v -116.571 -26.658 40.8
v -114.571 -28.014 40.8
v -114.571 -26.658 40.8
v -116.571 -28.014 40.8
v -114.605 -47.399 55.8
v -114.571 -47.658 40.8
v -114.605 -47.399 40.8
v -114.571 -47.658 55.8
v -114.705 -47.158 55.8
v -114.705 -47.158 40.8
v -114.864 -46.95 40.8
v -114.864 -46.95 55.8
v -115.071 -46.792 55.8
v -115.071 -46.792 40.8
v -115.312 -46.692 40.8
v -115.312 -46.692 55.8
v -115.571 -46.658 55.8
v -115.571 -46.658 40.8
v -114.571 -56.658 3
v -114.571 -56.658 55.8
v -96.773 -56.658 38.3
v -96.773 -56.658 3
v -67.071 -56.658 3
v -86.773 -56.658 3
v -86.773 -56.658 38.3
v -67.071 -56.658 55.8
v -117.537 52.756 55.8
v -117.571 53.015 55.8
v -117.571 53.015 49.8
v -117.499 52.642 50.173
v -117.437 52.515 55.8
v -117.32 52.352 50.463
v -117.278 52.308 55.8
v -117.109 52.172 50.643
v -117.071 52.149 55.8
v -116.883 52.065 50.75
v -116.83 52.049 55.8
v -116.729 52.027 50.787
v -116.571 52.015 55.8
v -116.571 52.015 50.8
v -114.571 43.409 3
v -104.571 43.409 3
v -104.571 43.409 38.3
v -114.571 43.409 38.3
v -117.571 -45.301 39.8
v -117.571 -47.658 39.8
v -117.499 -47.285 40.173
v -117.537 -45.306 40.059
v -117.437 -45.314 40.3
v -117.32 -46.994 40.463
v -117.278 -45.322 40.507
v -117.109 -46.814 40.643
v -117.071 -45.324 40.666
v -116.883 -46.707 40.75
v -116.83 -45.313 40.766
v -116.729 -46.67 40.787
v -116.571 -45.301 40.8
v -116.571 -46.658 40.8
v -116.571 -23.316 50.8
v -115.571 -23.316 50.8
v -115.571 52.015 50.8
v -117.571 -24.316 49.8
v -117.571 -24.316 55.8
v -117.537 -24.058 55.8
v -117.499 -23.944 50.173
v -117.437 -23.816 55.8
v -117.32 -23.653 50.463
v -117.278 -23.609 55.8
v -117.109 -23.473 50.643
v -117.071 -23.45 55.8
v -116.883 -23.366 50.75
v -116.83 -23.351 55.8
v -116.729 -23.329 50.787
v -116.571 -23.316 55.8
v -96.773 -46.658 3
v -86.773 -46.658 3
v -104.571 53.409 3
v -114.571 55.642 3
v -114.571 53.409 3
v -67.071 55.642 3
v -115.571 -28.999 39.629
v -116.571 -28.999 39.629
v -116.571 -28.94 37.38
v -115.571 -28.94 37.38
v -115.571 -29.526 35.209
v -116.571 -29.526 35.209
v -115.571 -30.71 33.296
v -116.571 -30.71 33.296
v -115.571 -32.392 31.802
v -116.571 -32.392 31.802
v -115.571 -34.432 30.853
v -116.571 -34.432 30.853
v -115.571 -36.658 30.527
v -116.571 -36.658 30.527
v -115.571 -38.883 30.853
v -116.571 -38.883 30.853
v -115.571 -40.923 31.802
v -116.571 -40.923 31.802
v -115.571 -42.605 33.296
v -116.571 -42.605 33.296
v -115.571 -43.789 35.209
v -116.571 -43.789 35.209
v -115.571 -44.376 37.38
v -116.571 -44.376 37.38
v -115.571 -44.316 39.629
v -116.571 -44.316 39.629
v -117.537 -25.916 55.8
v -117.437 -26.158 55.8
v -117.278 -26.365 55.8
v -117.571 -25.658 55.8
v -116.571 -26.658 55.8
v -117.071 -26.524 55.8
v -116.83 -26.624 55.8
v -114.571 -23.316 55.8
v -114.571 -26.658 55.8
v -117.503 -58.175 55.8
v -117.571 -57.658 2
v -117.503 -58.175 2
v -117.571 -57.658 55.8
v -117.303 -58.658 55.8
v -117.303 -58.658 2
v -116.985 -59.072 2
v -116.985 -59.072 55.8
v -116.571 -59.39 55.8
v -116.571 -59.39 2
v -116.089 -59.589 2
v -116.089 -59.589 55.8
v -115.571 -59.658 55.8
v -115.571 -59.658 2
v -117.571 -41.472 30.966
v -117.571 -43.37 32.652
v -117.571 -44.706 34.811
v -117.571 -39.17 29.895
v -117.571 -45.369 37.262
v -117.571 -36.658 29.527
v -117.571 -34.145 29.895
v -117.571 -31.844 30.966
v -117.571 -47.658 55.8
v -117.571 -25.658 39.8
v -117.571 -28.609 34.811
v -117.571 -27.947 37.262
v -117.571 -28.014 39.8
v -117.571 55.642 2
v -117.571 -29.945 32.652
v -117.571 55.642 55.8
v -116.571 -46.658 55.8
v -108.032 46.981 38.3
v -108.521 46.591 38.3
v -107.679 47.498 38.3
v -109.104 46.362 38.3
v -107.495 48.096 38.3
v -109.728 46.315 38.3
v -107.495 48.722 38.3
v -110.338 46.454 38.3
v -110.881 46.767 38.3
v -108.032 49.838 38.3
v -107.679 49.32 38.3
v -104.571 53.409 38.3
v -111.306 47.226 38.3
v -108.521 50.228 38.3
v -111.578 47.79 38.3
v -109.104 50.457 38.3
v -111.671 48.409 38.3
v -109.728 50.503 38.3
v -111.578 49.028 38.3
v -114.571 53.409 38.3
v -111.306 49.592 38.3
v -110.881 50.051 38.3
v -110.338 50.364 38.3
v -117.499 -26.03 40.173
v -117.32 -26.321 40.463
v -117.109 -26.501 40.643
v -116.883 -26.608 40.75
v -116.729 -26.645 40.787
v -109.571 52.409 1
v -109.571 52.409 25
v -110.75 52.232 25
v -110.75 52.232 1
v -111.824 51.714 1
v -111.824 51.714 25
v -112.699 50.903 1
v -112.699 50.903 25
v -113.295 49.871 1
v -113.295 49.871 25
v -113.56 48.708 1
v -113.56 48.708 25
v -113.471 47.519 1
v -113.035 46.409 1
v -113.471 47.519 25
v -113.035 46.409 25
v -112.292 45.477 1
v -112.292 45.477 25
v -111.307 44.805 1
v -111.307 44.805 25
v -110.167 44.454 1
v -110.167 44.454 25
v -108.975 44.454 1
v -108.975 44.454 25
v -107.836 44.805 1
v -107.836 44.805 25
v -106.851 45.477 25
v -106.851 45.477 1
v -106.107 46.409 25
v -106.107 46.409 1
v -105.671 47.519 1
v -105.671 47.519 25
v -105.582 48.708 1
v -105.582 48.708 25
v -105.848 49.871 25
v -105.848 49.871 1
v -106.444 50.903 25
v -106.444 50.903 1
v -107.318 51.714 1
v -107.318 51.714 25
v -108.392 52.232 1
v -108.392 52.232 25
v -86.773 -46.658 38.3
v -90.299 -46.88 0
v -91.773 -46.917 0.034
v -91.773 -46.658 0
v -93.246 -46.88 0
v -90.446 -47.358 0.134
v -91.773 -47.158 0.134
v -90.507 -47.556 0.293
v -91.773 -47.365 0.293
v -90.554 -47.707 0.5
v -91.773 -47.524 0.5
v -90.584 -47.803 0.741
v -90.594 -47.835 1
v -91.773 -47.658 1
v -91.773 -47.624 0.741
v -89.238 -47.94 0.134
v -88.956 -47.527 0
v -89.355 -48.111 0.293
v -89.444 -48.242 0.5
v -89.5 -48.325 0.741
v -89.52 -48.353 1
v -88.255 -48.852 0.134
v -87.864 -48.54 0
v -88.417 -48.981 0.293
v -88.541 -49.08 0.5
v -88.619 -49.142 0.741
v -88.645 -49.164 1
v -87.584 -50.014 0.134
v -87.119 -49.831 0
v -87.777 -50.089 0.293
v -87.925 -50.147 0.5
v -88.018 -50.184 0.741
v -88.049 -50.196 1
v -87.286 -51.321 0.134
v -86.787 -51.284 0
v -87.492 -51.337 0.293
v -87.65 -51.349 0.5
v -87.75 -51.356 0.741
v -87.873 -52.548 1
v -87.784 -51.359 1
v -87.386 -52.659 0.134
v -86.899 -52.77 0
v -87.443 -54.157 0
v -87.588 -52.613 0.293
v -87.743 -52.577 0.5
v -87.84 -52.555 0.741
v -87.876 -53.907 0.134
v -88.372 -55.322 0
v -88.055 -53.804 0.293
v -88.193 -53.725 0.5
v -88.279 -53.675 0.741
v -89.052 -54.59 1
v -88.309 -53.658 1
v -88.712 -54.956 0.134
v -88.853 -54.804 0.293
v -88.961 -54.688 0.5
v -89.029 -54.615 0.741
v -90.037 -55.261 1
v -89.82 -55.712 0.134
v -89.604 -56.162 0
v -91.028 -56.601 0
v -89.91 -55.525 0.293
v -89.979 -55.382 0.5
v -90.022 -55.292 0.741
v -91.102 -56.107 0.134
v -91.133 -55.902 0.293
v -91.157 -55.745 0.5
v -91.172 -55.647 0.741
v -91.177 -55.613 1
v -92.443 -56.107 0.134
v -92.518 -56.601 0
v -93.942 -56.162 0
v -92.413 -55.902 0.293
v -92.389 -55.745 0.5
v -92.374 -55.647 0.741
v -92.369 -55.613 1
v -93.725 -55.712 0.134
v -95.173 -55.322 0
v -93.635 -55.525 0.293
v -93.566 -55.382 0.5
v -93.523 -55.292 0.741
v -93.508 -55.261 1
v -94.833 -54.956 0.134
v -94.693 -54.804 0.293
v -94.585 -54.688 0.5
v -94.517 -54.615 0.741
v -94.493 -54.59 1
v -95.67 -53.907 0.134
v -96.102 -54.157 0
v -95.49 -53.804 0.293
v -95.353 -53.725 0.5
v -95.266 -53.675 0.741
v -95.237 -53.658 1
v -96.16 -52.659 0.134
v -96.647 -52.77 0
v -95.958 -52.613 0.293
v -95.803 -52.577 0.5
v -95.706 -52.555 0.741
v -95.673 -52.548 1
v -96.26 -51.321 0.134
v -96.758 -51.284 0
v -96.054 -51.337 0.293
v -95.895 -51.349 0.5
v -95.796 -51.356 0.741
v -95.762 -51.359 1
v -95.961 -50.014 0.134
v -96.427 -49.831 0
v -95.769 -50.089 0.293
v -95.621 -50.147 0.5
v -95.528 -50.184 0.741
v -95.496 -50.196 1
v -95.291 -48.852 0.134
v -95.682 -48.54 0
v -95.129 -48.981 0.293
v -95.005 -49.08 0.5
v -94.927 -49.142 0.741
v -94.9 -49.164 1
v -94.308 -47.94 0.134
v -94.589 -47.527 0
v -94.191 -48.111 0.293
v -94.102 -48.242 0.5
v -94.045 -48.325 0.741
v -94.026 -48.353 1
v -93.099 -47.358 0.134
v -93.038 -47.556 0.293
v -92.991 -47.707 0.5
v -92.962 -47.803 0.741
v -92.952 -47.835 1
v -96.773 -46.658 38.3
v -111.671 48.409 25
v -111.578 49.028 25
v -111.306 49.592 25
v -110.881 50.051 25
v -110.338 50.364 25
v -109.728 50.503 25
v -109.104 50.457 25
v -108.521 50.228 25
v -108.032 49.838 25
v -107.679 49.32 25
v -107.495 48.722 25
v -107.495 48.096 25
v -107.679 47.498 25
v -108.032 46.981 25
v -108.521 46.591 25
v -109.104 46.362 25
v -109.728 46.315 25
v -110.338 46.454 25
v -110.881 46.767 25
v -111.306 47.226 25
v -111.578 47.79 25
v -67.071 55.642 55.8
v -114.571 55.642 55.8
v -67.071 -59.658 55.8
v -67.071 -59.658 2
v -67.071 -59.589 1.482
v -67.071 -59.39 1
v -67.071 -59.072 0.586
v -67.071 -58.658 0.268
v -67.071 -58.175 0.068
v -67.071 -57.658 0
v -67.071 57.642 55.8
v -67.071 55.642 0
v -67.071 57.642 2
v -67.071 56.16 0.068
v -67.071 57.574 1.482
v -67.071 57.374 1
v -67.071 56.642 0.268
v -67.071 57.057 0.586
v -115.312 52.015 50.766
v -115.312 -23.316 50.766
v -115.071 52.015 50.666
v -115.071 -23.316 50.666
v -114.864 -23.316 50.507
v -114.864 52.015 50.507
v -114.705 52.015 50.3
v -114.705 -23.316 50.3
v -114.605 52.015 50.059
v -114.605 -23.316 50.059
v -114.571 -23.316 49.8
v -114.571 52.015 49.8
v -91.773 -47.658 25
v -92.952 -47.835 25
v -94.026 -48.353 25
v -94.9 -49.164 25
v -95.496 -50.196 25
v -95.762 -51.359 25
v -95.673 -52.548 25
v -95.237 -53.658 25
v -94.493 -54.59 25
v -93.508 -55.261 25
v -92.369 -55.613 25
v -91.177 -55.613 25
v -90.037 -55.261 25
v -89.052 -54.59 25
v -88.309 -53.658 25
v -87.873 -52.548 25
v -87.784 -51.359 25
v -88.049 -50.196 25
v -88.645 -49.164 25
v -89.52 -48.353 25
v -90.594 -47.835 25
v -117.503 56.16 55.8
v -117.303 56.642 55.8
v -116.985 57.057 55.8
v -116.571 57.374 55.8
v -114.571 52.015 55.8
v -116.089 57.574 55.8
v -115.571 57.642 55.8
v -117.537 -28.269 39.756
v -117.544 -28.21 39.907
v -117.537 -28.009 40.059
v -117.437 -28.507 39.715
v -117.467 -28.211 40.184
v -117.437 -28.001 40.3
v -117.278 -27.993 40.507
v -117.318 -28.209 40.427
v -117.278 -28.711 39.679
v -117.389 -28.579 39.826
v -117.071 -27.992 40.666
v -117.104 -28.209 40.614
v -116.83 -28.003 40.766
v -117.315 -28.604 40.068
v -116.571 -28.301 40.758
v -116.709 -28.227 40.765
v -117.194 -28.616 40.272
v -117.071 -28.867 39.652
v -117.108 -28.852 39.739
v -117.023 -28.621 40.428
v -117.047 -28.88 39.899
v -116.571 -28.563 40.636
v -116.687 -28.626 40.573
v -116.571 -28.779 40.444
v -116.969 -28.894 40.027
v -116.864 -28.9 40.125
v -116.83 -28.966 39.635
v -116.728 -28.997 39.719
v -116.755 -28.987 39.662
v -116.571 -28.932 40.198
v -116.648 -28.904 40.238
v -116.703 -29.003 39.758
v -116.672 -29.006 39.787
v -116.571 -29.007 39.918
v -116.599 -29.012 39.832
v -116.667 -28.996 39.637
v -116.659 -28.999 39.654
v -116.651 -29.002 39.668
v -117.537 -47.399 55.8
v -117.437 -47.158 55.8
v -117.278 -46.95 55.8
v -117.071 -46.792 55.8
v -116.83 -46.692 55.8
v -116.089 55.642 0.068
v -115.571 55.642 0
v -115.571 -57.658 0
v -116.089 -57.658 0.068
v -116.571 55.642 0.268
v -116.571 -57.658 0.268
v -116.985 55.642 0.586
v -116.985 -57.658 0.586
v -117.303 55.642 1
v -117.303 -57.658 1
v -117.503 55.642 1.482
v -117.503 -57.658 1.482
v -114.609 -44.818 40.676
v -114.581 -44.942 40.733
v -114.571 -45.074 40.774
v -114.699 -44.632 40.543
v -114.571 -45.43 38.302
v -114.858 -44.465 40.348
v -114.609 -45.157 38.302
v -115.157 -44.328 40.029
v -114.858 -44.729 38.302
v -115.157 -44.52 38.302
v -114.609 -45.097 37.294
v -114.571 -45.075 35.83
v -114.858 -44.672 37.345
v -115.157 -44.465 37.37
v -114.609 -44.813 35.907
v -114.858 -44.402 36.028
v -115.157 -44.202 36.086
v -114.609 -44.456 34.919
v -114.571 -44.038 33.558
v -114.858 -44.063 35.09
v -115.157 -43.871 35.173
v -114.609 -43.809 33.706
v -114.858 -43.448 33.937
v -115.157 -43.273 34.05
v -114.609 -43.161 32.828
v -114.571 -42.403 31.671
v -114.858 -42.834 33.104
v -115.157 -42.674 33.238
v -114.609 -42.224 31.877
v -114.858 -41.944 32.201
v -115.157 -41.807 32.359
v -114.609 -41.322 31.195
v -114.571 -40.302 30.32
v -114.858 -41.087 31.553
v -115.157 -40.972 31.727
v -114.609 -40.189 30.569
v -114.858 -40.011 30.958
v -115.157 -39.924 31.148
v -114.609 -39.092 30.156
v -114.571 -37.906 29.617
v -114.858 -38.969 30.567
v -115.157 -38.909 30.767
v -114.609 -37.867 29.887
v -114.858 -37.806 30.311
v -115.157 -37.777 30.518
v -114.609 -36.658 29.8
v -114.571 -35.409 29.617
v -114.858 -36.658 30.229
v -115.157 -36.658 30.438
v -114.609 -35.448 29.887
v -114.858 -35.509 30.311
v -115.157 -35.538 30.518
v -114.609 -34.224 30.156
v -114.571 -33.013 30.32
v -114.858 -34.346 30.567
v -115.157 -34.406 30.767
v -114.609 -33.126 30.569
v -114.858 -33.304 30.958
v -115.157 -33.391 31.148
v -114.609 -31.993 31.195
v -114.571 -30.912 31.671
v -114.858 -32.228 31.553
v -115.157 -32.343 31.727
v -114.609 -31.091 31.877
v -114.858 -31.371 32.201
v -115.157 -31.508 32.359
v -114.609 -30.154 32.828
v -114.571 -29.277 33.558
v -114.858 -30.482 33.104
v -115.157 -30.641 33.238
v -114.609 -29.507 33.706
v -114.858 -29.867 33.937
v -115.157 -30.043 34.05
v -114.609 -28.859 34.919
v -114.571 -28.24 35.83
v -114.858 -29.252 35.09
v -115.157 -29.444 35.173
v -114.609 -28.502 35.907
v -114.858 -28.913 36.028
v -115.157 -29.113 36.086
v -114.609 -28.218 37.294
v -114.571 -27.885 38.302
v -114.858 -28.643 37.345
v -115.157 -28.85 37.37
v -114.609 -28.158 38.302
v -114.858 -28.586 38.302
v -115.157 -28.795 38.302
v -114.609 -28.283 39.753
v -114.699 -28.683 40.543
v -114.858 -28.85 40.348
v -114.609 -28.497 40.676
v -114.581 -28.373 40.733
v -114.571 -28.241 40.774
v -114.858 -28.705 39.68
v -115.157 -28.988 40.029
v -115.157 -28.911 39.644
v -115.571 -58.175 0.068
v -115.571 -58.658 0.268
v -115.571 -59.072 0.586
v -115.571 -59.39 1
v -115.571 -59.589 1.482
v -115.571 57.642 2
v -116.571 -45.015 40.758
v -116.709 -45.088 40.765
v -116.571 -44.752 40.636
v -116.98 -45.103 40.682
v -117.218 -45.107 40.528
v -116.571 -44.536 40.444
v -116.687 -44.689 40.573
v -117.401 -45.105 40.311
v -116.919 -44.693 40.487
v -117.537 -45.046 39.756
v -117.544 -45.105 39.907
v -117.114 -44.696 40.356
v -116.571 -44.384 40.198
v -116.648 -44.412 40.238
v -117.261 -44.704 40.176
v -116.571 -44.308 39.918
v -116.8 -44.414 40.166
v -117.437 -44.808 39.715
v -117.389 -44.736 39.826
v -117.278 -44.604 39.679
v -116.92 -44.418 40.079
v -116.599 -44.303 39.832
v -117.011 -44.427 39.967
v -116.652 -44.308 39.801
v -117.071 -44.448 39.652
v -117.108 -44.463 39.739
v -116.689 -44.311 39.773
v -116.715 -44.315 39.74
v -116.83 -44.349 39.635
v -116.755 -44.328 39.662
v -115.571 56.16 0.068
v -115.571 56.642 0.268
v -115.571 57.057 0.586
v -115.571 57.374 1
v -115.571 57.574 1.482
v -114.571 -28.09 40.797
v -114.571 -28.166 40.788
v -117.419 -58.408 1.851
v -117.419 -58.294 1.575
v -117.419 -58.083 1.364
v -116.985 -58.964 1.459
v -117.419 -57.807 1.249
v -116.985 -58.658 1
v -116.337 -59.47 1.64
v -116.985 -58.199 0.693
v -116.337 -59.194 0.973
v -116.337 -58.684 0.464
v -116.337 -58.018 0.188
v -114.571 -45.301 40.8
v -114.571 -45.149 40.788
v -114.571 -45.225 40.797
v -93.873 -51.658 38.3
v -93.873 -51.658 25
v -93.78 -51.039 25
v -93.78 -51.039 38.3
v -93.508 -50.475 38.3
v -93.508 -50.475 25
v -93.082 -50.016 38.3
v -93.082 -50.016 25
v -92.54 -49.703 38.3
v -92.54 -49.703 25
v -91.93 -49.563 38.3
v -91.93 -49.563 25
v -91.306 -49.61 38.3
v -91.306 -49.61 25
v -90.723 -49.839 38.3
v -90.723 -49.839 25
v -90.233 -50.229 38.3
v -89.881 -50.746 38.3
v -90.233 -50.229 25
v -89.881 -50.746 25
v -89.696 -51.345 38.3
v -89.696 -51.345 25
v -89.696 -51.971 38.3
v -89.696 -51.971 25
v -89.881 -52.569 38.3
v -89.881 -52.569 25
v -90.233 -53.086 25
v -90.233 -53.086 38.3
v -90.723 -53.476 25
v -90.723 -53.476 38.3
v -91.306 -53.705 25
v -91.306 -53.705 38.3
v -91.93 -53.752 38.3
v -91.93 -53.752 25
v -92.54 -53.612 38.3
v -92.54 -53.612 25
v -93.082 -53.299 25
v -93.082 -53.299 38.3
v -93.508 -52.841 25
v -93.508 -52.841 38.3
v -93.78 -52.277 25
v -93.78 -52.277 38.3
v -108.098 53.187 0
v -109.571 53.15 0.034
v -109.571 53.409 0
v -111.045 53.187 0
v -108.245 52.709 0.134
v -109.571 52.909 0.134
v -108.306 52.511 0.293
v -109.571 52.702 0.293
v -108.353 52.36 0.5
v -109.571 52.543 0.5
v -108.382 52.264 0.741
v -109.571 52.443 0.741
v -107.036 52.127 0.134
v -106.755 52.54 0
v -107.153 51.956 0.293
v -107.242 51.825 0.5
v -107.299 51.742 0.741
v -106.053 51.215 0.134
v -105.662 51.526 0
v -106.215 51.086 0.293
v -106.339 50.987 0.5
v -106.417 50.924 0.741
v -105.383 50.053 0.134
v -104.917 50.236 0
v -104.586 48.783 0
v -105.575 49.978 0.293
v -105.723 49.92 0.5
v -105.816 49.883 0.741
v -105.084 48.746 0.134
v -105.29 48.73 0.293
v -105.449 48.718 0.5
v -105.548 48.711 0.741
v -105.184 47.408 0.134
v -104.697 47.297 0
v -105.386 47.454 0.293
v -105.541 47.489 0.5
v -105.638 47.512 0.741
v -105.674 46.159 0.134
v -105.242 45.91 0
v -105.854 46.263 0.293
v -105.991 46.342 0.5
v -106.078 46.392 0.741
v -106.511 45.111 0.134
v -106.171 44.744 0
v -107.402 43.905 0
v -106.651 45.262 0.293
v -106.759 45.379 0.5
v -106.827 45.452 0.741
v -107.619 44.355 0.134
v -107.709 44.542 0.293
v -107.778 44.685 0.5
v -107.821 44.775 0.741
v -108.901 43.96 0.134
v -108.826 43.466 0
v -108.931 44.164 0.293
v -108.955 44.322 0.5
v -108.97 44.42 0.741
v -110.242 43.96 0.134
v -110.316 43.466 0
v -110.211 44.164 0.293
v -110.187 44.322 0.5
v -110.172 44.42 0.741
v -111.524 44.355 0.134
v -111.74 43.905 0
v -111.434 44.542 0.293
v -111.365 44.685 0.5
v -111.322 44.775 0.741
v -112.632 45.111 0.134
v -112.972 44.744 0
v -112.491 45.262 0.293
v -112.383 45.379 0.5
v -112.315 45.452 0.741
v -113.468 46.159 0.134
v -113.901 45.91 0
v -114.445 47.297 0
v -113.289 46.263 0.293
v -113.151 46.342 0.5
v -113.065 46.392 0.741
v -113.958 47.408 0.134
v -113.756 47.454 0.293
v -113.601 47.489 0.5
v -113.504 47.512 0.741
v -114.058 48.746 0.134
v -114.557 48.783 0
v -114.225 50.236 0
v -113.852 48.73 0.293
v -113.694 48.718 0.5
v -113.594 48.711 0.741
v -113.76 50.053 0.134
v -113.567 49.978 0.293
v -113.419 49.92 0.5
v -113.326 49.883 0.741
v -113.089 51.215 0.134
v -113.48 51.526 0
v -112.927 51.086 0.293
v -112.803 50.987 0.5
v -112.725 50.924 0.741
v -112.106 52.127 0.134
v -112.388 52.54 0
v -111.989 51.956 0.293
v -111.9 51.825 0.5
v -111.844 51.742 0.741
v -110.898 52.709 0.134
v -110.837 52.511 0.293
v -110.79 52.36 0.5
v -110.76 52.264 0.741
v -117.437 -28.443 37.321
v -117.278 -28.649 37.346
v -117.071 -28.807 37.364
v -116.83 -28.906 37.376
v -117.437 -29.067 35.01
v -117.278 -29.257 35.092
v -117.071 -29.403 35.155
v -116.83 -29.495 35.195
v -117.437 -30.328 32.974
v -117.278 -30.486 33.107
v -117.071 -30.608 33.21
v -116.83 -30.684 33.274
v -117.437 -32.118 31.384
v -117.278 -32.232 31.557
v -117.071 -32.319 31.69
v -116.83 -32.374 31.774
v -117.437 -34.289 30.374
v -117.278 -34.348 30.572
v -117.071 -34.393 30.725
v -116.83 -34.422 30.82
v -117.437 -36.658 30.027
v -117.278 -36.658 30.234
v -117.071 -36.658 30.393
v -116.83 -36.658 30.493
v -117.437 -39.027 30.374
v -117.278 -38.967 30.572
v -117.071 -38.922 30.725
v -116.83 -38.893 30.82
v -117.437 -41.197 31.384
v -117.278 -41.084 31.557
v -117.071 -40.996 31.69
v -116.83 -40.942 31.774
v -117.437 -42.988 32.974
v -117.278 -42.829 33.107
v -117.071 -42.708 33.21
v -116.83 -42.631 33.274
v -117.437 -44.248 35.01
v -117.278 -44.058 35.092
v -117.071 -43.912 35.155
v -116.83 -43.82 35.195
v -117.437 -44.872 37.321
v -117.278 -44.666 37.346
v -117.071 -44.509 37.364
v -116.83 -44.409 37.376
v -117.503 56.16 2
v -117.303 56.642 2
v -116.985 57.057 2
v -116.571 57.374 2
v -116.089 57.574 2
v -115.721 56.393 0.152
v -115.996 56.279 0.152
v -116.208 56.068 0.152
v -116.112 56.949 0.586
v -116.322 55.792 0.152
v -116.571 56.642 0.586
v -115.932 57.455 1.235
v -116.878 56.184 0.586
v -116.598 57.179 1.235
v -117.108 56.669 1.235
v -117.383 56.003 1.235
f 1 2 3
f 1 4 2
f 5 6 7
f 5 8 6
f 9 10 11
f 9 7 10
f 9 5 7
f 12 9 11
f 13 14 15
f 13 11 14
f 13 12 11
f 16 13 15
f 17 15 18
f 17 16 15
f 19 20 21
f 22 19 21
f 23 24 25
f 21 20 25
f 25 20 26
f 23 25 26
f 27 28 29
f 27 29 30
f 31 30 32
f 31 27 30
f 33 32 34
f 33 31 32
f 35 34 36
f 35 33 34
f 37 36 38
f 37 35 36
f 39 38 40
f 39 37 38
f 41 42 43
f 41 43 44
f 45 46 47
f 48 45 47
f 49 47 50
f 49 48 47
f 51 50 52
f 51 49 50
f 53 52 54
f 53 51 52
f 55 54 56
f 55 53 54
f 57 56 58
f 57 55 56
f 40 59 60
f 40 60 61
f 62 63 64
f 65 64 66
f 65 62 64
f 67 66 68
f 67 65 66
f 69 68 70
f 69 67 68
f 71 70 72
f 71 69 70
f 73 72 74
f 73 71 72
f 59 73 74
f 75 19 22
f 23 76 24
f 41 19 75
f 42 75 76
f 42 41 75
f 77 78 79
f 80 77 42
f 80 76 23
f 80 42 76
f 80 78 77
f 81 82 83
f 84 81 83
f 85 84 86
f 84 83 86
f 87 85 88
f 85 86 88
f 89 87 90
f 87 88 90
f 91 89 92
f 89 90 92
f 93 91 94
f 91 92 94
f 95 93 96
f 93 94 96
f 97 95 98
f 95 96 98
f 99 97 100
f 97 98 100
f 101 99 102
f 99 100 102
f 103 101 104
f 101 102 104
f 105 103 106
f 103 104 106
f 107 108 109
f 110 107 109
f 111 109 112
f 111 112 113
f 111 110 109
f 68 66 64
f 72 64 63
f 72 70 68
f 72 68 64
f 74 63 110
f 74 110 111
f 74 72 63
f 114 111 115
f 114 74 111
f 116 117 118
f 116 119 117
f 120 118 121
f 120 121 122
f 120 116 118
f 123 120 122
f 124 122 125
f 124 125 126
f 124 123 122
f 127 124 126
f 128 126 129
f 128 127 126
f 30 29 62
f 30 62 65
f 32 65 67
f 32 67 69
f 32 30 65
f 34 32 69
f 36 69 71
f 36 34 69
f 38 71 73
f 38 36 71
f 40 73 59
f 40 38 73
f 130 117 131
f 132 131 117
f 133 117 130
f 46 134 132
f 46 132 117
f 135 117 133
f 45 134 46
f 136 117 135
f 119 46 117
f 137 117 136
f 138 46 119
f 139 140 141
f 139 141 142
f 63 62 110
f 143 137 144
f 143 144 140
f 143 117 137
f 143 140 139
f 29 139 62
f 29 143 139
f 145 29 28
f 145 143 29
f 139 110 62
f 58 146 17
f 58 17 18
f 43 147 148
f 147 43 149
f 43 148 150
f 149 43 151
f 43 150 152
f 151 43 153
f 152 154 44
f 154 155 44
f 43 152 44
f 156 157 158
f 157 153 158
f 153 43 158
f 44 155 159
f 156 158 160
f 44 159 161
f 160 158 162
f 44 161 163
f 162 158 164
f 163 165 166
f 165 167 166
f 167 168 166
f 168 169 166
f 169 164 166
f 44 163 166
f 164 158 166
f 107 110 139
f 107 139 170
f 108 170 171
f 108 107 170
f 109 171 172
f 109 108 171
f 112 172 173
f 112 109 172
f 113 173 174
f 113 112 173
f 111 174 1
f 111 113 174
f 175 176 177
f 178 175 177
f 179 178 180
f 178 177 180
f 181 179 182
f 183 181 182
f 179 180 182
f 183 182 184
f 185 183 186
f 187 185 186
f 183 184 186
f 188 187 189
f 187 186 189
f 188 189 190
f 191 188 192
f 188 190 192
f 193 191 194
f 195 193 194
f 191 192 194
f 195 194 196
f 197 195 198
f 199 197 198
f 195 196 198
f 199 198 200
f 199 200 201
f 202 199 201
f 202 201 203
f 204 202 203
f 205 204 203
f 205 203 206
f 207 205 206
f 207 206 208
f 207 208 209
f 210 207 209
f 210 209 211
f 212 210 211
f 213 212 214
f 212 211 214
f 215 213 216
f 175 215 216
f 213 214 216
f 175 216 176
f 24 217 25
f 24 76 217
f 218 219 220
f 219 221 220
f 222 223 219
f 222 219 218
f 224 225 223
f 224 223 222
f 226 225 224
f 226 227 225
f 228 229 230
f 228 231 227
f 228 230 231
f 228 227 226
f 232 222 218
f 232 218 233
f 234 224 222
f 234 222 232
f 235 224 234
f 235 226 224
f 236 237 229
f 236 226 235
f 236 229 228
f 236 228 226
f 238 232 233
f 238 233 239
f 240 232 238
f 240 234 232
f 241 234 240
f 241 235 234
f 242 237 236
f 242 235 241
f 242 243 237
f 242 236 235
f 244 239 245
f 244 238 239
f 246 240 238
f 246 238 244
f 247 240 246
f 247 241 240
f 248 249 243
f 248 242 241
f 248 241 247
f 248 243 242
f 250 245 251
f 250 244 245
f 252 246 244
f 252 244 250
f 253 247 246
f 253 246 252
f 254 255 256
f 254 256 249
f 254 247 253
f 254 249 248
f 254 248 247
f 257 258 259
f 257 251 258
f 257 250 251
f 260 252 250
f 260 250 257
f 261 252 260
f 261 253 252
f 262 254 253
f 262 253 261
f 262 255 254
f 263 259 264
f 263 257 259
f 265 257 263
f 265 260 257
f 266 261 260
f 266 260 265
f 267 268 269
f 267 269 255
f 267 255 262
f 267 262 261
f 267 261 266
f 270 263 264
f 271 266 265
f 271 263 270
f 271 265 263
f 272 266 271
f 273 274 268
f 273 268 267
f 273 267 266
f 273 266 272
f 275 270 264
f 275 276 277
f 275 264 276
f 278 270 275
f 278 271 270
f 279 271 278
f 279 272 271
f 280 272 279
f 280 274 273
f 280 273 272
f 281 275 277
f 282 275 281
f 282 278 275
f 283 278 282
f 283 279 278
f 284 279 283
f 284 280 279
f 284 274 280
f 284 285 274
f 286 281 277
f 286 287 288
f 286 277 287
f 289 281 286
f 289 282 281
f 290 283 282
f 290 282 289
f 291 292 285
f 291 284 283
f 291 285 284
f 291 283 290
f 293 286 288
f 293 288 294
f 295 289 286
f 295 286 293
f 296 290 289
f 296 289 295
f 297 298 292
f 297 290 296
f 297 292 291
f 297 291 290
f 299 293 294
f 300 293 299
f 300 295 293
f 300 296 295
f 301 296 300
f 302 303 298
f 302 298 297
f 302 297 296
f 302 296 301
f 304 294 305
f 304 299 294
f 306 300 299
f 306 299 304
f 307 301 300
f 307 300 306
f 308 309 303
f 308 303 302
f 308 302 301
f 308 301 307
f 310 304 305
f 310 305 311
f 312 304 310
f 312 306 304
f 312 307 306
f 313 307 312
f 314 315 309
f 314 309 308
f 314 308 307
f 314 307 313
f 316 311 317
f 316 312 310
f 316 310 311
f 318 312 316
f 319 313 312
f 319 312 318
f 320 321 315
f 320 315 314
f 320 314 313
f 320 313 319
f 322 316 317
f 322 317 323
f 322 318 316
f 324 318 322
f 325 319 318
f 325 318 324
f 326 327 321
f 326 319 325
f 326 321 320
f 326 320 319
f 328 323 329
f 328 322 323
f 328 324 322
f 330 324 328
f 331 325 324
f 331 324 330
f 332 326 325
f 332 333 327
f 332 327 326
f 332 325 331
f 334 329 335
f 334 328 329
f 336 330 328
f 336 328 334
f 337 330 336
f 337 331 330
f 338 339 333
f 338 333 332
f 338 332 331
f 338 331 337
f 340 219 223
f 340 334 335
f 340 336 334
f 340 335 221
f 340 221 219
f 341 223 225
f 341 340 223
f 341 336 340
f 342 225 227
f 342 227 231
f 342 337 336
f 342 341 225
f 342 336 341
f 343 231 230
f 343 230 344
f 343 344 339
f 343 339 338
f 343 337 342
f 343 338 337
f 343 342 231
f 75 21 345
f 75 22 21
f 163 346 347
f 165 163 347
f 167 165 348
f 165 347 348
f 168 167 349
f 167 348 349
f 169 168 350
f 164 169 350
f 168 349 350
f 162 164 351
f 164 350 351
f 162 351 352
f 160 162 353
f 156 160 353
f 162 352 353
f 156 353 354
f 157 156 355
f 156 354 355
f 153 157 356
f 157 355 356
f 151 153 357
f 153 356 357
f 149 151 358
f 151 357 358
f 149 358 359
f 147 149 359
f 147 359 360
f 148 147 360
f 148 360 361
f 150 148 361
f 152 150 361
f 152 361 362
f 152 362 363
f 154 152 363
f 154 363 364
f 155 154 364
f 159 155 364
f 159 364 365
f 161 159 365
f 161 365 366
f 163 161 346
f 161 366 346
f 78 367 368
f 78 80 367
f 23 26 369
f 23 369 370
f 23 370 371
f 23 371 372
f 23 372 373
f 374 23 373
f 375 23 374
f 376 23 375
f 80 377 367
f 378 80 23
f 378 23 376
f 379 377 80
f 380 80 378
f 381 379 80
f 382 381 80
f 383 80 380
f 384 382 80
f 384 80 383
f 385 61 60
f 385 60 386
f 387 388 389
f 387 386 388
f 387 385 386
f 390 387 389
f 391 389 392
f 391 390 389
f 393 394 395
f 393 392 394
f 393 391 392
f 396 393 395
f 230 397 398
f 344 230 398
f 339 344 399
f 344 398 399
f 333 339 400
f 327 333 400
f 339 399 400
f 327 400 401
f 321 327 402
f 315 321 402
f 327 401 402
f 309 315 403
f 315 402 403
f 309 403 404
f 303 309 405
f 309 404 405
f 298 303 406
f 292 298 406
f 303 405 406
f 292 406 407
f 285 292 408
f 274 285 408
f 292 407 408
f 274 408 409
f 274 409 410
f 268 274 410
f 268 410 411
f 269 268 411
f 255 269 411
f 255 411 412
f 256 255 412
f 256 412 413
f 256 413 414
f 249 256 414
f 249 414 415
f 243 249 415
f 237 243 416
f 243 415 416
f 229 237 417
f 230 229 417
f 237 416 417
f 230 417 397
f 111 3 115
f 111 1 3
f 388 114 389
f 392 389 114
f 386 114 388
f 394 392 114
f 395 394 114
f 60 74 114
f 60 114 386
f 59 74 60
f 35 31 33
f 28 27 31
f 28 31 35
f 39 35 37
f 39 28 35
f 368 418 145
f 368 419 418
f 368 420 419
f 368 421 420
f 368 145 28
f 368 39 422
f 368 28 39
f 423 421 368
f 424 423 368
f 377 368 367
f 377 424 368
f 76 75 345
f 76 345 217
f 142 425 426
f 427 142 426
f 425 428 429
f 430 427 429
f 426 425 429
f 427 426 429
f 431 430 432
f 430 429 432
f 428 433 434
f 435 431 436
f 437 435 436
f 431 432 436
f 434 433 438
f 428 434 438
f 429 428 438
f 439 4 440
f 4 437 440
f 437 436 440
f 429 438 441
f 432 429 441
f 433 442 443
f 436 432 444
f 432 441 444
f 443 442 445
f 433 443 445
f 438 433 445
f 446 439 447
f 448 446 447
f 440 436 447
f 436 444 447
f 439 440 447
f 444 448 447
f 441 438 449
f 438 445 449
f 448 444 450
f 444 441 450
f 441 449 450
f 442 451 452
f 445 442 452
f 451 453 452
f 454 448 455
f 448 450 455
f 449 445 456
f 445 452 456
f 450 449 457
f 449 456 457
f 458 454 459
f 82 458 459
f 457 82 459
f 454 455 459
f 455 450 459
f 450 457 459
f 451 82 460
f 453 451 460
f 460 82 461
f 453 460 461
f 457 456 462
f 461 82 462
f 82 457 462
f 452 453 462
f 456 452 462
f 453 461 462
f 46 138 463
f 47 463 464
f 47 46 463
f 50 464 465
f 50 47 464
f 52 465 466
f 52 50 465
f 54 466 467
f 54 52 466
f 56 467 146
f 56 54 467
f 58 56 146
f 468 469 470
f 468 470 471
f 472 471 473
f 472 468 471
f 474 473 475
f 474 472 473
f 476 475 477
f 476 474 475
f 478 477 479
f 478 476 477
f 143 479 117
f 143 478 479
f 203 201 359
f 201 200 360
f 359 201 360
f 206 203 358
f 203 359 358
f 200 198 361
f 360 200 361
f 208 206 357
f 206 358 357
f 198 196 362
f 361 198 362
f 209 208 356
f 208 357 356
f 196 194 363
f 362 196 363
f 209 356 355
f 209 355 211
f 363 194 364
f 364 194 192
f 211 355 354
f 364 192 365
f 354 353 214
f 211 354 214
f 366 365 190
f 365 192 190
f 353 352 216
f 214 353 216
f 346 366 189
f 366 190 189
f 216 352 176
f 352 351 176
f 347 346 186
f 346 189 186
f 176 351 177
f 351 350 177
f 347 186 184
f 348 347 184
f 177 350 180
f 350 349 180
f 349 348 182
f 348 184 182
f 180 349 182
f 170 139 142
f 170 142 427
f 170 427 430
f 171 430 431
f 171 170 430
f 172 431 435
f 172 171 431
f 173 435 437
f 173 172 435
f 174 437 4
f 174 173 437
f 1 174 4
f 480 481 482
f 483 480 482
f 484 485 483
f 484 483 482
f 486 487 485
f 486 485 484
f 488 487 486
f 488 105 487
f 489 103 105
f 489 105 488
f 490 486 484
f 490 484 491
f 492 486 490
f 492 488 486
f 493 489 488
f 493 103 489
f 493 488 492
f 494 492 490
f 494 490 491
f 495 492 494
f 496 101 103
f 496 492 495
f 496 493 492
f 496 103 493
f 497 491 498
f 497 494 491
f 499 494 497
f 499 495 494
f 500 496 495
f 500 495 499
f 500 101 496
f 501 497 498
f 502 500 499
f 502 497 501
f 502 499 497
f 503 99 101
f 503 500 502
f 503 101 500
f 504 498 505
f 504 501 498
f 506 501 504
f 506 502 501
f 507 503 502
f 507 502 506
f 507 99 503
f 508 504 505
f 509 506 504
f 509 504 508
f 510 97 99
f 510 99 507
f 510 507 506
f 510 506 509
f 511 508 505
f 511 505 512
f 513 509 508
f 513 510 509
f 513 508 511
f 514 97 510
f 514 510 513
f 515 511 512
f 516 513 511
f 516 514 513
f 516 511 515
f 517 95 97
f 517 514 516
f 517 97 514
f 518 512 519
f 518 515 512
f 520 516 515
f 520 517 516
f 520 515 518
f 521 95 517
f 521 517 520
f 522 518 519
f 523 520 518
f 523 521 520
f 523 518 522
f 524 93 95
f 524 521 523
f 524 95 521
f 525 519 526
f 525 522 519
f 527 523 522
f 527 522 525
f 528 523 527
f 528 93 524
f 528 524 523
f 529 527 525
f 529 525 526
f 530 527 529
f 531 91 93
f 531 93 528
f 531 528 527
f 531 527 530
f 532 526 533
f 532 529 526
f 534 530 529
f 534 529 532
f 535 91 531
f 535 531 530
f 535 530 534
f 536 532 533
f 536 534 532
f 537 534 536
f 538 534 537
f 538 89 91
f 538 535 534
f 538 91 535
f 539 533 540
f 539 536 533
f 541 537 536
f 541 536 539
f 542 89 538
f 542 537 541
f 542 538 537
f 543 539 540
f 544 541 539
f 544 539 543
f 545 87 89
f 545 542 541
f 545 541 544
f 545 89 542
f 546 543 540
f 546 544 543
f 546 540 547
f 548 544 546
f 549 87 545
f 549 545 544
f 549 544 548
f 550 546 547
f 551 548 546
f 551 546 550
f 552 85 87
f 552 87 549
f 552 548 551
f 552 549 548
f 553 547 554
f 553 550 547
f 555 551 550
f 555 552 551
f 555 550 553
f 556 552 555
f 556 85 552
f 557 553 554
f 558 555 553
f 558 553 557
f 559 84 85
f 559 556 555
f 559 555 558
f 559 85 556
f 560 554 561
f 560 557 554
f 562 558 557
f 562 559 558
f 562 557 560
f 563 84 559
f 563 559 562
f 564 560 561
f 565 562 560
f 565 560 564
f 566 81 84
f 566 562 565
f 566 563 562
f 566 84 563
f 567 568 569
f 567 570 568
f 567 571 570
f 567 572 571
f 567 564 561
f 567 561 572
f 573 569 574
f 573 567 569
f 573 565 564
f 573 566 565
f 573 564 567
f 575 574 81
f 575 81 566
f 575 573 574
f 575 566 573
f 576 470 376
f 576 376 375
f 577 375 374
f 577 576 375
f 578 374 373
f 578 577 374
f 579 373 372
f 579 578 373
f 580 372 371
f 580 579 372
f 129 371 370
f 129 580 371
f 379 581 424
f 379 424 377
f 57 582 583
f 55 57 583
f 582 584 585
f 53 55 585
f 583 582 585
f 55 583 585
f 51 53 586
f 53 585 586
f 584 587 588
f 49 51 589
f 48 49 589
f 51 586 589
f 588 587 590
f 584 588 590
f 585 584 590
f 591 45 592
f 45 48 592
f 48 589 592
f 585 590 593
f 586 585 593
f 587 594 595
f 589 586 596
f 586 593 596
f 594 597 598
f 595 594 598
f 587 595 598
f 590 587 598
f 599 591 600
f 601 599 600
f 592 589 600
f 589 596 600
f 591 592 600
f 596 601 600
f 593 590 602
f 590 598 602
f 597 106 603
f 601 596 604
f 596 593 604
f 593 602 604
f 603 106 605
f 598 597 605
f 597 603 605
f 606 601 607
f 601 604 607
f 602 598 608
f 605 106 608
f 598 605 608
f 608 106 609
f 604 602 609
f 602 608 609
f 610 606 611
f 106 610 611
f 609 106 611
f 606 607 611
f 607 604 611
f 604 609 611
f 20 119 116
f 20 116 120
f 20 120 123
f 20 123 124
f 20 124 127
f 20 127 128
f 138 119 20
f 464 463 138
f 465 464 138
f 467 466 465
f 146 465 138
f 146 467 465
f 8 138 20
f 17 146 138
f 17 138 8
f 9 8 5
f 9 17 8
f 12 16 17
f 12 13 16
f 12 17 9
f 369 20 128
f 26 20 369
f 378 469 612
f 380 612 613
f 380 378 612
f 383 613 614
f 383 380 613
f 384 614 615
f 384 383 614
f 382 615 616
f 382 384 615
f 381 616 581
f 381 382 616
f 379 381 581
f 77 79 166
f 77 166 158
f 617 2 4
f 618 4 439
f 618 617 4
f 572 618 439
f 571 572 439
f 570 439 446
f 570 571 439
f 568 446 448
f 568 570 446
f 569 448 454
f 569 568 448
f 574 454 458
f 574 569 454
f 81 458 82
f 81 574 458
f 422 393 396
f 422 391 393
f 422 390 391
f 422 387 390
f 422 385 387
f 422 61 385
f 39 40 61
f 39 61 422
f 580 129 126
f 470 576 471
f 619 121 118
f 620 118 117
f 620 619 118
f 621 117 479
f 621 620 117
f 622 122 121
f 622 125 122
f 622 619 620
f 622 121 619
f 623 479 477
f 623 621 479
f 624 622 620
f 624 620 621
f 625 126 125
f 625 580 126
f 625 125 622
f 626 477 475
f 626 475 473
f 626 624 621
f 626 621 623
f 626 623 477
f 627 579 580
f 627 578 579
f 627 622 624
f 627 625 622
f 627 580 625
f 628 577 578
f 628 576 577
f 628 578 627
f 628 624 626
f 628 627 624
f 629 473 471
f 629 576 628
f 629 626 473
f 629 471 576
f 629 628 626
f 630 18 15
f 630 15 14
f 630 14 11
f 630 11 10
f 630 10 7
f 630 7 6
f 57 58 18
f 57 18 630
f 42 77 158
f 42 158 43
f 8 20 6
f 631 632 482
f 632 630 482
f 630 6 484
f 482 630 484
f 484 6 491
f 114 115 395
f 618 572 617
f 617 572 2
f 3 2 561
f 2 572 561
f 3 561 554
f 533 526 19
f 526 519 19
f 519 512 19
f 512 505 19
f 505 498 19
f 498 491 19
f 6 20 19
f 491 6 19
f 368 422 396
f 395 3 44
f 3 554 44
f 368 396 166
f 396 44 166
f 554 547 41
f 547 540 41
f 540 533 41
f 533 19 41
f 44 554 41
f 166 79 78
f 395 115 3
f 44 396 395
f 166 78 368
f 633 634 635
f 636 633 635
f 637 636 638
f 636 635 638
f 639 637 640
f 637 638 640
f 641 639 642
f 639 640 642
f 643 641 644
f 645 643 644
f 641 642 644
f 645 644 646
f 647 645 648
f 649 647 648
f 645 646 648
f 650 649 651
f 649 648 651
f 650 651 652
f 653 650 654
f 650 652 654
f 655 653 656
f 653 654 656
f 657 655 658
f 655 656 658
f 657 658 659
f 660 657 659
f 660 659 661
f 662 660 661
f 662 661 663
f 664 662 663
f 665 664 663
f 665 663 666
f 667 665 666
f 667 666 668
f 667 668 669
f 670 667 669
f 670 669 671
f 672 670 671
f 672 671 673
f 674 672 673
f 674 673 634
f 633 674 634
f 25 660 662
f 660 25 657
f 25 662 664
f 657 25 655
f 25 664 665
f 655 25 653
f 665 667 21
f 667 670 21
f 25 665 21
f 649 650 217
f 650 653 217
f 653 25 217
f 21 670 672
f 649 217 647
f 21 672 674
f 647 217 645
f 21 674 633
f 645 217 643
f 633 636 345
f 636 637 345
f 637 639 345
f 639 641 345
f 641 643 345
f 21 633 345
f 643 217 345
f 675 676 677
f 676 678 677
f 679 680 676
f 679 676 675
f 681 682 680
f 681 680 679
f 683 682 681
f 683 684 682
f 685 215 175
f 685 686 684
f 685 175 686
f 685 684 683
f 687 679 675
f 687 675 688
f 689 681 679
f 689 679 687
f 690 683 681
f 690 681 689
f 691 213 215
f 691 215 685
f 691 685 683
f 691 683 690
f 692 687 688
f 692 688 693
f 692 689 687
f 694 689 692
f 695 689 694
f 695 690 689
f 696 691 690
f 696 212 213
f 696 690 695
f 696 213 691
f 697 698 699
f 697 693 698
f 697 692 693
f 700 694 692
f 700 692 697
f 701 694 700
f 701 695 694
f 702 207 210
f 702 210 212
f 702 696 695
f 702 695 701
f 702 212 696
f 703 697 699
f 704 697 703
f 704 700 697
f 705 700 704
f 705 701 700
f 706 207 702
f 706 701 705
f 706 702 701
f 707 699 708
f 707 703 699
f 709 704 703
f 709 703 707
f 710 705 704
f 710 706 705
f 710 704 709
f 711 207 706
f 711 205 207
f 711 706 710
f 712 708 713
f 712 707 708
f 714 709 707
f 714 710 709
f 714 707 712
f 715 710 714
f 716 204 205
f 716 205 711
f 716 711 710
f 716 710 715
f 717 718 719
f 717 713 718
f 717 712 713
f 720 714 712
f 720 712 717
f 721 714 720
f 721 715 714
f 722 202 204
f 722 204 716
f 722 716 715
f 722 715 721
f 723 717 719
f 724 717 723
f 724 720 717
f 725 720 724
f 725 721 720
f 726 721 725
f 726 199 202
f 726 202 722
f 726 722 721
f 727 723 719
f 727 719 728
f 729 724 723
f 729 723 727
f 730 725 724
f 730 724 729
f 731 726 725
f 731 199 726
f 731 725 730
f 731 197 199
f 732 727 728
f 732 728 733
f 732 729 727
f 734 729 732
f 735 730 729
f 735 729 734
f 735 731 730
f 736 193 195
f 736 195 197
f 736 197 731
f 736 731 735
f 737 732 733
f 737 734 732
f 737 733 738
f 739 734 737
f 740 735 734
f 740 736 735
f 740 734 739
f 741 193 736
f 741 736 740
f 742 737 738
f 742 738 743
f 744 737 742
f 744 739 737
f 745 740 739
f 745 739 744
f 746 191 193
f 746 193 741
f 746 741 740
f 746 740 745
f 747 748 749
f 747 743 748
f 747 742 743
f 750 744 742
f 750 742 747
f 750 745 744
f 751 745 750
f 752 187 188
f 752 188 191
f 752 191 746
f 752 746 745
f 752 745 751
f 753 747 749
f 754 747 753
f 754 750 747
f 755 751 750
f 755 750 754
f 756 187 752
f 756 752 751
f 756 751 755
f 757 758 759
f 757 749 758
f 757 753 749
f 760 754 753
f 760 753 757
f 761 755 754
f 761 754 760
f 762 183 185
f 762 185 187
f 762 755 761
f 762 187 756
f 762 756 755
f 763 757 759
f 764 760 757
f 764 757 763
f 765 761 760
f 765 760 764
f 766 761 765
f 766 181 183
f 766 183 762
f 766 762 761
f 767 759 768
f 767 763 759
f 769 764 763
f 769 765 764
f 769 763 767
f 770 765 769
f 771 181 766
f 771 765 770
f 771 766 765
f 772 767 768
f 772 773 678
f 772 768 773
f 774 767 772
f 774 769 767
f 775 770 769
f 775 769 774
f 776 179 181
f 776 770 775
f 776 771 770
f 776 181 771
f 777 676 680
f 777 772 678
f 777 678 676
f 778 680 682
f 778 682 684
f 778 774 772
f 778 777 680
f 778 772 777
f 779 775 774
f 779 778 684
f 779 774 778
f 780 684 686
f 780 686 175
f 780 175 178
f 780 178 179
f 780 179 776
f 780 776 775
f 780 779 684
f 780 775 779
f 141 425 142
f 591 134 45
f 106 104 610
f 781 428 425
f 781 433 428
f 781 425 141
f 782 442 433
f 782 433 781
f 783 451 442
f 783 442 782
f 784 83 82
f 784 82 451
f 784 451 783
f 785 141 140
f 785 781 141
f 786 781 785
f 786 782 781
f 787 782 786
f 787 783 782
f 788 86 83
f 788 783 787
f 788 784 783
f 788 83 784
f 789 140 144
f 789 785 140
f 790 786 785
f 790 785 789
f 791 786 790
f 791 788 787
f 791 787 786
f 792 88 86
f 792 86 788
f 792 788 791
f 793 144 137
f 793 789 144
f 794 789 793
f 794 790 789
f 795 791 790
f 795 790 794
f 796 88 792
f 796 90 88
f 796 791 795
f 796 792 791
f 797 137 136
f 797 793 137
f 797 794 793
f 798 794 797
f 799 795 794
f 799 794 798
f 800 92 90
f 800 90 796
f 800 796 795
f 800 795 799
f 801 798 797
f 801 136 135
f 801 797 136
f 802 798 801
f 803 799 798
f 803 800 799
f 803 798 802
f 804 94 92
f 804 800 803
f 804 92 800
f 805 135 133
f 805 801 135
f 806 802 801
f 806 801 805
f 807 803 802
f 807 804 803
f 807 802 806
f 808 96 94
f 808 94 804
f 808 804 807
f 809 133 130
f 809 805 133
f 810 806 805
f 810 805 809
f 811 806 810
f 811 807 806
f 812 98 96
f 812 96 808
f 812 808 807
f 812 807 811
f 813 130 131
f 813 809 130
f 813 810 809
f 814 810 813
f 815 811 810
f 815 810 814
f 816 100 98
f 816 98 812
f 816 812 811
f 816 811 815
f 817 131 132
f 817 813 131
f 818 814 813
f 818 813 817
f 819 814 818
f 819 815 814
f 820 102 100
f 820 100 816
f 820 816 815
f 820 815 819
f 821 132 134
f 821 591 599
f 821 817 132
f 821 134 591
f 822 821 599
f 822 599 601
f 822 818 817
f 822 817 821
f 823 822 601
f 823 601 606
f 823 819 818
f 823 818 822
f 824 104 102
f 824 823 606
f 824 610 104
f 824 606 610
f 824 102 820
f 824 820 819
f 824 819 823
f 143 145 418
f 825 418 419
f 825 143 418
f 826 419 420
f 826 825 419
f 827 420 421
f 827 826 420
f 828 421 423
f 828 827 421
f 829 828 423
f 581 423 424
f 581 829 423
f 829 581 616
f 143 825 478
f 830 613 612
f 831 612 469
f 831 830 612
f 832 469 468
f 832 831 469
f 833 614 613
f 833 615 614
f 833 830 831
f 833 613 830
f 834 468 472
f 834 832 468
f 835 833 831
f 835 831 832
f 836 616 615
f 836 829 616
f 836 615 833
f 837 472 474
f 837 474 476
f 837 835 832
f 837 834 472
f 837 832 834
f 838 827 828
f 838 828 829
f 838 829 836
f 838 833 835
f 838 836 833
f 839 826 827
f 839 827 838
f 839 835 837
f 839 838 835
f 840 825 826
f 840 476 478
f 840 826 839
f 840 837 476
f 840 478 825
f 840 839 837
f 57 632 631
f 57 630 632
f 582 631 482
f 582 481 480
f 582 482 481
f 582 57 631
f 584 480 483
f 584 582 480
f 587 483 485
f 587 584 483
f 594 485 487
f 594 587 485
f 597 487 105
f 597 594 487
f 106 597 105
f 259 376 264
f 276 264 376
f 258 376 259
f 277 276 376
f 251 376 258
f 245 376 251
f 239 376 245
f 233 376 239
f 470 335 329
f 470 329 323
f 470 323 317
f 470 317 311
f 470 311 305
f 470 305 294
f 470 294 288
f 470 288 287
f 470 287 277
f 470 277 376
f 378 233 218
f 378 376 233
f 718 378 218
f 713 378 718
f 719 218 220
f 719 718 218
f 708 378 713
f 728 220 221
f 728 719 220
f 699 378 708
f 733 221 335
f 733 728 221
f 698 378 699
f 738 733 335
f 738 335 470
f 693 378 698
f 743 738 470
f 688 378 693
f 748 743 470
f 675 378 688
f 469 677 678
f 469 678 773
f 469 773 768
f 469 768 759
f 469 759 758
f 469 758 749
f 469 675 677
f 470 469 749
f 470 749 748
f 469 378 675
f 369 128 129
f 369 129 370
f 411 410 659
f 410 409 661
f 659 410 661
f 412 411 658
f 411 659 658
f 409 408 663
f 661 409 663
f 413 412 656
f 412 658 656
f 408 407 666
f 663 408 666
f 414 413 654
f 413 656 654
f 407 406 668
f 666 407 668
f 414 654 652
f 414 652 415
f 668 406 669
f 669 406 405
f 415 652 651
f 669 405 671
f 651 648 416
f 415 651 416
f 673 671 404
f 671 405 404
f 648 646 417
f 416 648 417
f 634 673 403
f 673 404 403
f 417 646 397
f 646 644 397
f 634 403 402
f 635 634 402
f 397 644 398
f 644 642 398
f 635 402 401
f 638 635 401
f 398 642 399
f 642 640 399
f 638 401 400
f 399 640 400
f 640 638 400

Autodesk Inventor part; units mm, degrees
ref_plane "YZ Plane" through (0, 0, 0) normal (1, 0, 0) x (0, 1, 0)
ref_plane "XZ Plane" through (0, 0, 0) normal (0, 1, 0) x (-1, 0, 0)
sketch "Skizze1" plane through (0, 0, 0) normal (0, 0, 1) x (1, 0, 0)
  line L0 (105.8135, 54.6424) -> (-70.1865, 54.6424) construction
  line L1 (-70.1865, 54.6424) -> (-70.1865, -55.3576) construction
  line L2 (-70.1865, -55.3576) -> (-86.1865, -55.3576) construction
  line L3 (-86.1865, -55.3576) -> (-86.1865, -56.6576) construction
  line L4 (112.8344, -56.6576) -> (-86.1865, -56.6576) construction
  line L5 (112.8344, -55.3576) -> (112.8344, -56.6576) construction
  line L6 (112.8344, -55.3576) -> (105.8135, -55.3576) construction
  line L7 (105.8135, -55.3576) -> (105.8135, 54.6424) construction
  line L8 (-104.5712, -45.4245) -> (-104.5712, -55.4245) construction
  line L9 (112.8135, -55.4245) -> (-104.5712, -55.4245) construction
  line L10 (112.8135, 46.962) -> (112.8135, -55.4245) construction
  line L11 (110.3928, 46.962) -> (112.8135, 46.962) construction
  arc A0 (110.3928, 50.262) -> (110.3928, 46.962) centre (110.3928, 48.612) ccw construction
  line L12 (112.8135, 50.262) -> (110.3928, 50.262) construction
  line L13 (112.8135, 54.6424) -> (112.8135, 50.262) construction
  line L14 (-86.7728, 54.6424) -> (112.8135, 54.6424) construction
  line L15 (-86.7728, 54.6424) -> (-86.7728, 44.6424) construction
  line L16 (-86.7728, 44.6424) -> (-96.7728, 44.6424) construction
  line L17 (-96.7728, 44.6424) -> (-96.7728, 54.6424) construction
  line L18 (-112.5712, 54.6424) -> (-96.7728, 54.6424) construction
  arc A1 (-112.5712, 54.6424) -> (-114.5712, 52.6424) centre (-112.5712, 52.6424) ccw construction
  line L19 (-114.5712, 44.6424) -> (-114.5712, 52.6424) construction
  line L20 (-114.5712, 44.6424) -> (-104.5712, 44.6424) construction
  line L21 (-104.5712, 44.6424) -> (-104.5712, 24.6424) construction
  line L22 (-104.5712, 24.6424) -> (-114.5712, 24.6424) construction
  line L23 (-114.5712, -45.4245) -> (-114.5712, 24.6424) construction
  line L24 (-114.5712, -45.4245) -> (-104.5712, -45.4245) construction
  circle A2 centre (-81.2226, -51.7118) radius 2 construction
  circle A3 centre (-109.5712, -50.4245) radius 1.75 construction
  arc A4 (-114.5712, -53.4245) -> (-112.5712, -55.4245) centre (-112.5712, -53.4245) ccw construction
  line L25 (-112.5712, -55.4245) -> (-104.5712, -55.4245) construction
  line L26 (-104.5712, -55.4245) -> (-104.5712, -45.4245) construction
  line L27 (-104.5712, -45.4245) -> (-114.5712, -45.4245) construction
  line L28 (-114.5712, -45.4245) -> (-114.5712, -53.4245) construction
  circle A5 centre (-91.7728, 49.6424) radius 1.75 construction
  line L29 (-86.7728, 54.6424) -> (-96.7728, 54.6424) construction
  line L30 (-96.7728, 54.6424) -> (-96.7728, 44.6424) construction
  line L31 (-96.7728, 44.6424) -> (-86.7728, 44.6424) construction
  line L32 (-86.7728, 44.6424) -> (-86.7728, 54.6424) construction
  line L33 (-114.5712, 42.6424) -> (-114.5712, 26.6424) construction
  arc A6 (-114.5712, 26.6424) -> (-112.5712, 24.6424) centre (-112.5712, 26.6424) ccw construction
  arc A7 (-112.5712, 44.6424) -> (-114.5712, 42.6424) centre (-112.5712, 42.6424) ccw construction
  line L34 (-114.5712, -56.6576) -> (-67.0712, -56.6576)
  line L35 (-67.0712, -56.6576) -> (-67.0712, 54.6424)
  line L36 (-67.0712, 54.6424) -> (-114.5712, 54.6424)
  line L37 (-114.5712, 54.6424) -> (-114.5712, -56.6576)
  point P0 (0, 0)
extrude "Extrusion1" add sketch "Skizze1" along normal blind 3
sketch "Skizze2" plane through (0, 0, 0) normal (0, 0, -1) x (-1, 0, 0)
  line L0 (104.5712, 43.4093) -> (114.5712, 43.4093) projected
  line L1 (104.5712, 53.4093) -> (104.5712, 43.4093) projected
  line L2 (112.5712, 53.4093) -> (104.5712, 53.4093) projected
  circle A0 centre (109.5712, 48.4093) radius 1.75 projected
  line L3 (114.5712, 54.6424) -> (114.5712, -56.6576) projected
  circle A1 centre (91.7728, -51.6576) radius 1.75 projected
  line L4 (86.7728, -46.6576) -> (86.7728, -56.6576) projected
  line L5 (114.5712, -56.6576) -> (67.0712, -56.6576) projected
  line L6 (96.7728, -46.6576) -> (86.7728, -46.6576) projected
  line L7 (96.7728, -56.6576) -> (96.7728, -46.6576) projected
  line L8 (114.5712, 54.6424) -> (114.5712, -56.6576) projected
  line L9 (104.5712, 43.4093) -> (114.5712, 43.4093)
  line L10 (114.5712, 43.4093) -> (114.5712, 53.4093)
  line L11 (114.5712, 53.4093) -> (104.5712, 53.4093)
  line L12 (104.5712, 53.4093) -> (104.5712, 43.4093)
  line L13 (86.7728, -56.6576) -> (96.7728, -56.6576)
  line L14 (96.7728, -56.6576) -> (96.7728, -46.6576)
  line L15 (96.7728, -46.6576) -> (86.7728, -46.6576)
  line L16 (86.7728, -46.6576) -> (86.7728, -56.6576)
  circle A2 centre (91.7728, -51.6576) radius 2.1
  circle A3 centre (109.5712, 48.4093) radius 2.1
  point P0 (0, 0)
  dimension "d3" = 4.2
  dimension "d4" = 4.2
ref_plane "Arbeitsebene1" through (-114.5712, 43.4093, 38.3) normal (0, 0, -1) x (0, 1, 0)
extrude "Extrusion2" add sketch "Skizze2" against normal up to surface (38.3 mm away) contours L1 L2 L11 L3 L0 | L5 L4 L6 L7
sketch "Skizze3" plane through (0, 0, 0) normal (0, 0, -1) x (-1, 0, 0)
  circle A0 centre (91.7728, -51.6576) radius 2.1 projected
  circle A1 centre (109.5712, 48.4093) radius 2.1 projected
  point P0 (0, 0)
hole "Bohrung1" at (-109.5712, 48.4093, 0) at (-91.7728, -51.6576, 0) direction (0, 0, 1) diameter 4.2 depth 38.3 counterbore diameter 8 counterbore depth 25
fillet "Rundung1" radius 1 2 edges at (-91.7728, -55.6576, 0) (-109.5712, 44.4093, 0)
sketch "Skizze4" plane through (-114.5712, 54.6424, 0) normal (-1, 0, 0) x (0, 0, 1)
  line L0 (3, 0) -> (3, -1.2331) construction
  line L1 (0, 0) -> (3, 0) construction
  line L2 (0, 0) -> (0, -6.2331) construction
  line L3 (0, -6.2331) -> (0, -111.3) construction
  line L4 (0, -111.3) -> (3, -111.3) construction
  line L5 (3, -11.2331) -> (3, -111.3) construction
  line L6 (3, -11.2331) -> (38.3, -11.2331) construction
  line L7 (38.3, -1.2331) -> (38.3, -11.2331) construction
  line L8 (3, -1.2331) -> (38.3, -1.2331) construction
  line L9 (25, -102.3) -> (1, -102.3) construction
  line L10 (3, -111.3) -> (38.3, -111.3) construction
  line L11 (55.8, -3.2331) -> (55.8, -109.3) construction
  line L12 (0, -111.3) -> (55.8, -111.3)
  line L13 (55.8, -111.3) -> (55.8, 0)
  line L14 (55.8, 0) -> (0, 0)
  line L15 (0, 0) -> (0, -111.3)
  point P0 (0, -54.6424)
extrude "Extrusion4" add sketch "Skizze4" along normal blind 3
sketch "Skizze5" plane through (-67.0712, 54.6424, 3) normal (0, 1, 0) x (1, 0, 0)
  line L0 (0, 3) -> (-50.5, 3) construction
  line L1 (-50.5, -52.8) -> (-50.5, 3) construction
  line L2 (179.8847, -52.8) -> (-45.5, -52.8) construction
  line L3 (-50.5, 3) -> (0, 3)
  line L4 (0, 3) -> (0, -52.8)
  line L5 (0, -52.8) -> (-50.5, -52.8)
  line L6 (-50.5, -52.8) -> (-50.5, 3)
  point P0 (67.0712, 3)
extrude "Extrusion5" add sketch "Skizze5" along normal blind 3
fillet "Rundung2" radius 2 1 edges at (-117.5712, 57.6424, 27.9)
sketch "Skizze6" plane through (-67.0712, -56.6576, 0) normal (0, -1, 0) x (1, 0, 0)
  line L0 (-47.5, 3) -> (-29.7016, 3) construction
  line L1 (-47.5, 3) -> (-47.5, 55.8) construction
  line L2 (-47.5, 55.8) -> (-50.5, 55.8) construction
  line L3 (-50.5, 0) -> (-50.5, 55.8) construction
  line L4 (-50.5, 0) -> (-24.7016, 0) construction
  line L5 (-24.7016, 0) -> (0, 0) construction
  line L6 (0, 0) -> (0, 3) construction
  line L7 (-19.7016, 3) -> (0, 3) construction
  line L8 (-19.7016, 3) -> (-19.7016, 38.3) construction
  line L9 (-29.7016, 38.3) -> (-19.7016, 38.3) construction
  line L10 (-29.7016, 3) -> (-29.7016, 38.3) construction
  line L11 (0, 3) -> (0, 55.8) construction
  line L12 (-45.5, 55.8) -> (179.8847, 55.8) construction
  line L13 (-50.5, 55.8) -> (-48.5, 55.8) projected
  line L14 (0, 0) -> (-50.5, 0)
  line L15 (-50.5, 0) -> (-50.5, 55.8)
  line L16 (-50.5, 55.8) -> (0, 55.8)
  line L17 (0, 55.8) -> (0, 0)
  point P0 (67.0712, 0)
extrude "Extrusion6" add sketch "Skizze6" along normal blind 3
fillet "Rundung3" radius 2 3 edges at (-92.3212, -59.6576, 0) (-117.5712, -59.6576, 27.9) (-91.3212, 57.6424, 0)
sketch "Skizze7" plane through (0, 0, 3) normal (0, 0, 1) x (1, 0, 0)
  arc A0 (-117.5712, -57.6576) -> (-115.5712, -59.6576) centre (-115.5712, -57.6576) ccw construction
  line L0 (-67.0712, -59.6576) -> (-115.5712, -59.6576) construction
  line L1 (-67.0712, -56.6576) -> (-67.0712, -59.6576) construction
  line L2 (-67.0712, -56.6576) -> (-114.5712, -56.6576) construction
  line L3 (-114.5712, -56.6576) -> (-114.5712, 54.6424) construction
  line L4 (-67.0712, 54.6424) -> (-114.5712, 54.6424) construction
  line L5 (-67.0712, 54.6424) -> (-67.0712, 57.6424) construction
  line L6 (-115.5712, 57.6424) -> (-67.0712, 57.6424) construction
  arc A1 (-115.5712, 57.6424) -> (-117.5712, 55.6424) centre (-115.5712, 55.6424) ccw construction
  line L7 (-117.5712, 55.6424) -> (-117.5712, -57.6576) construction
  line L8 (112.8135, 53.4093) -> (-112.5712, 53.4093) construction
  line L9 (-67.0712, 54.6424) -> (-114.5712, 54.6424) construction
  line L10 (-67.0712, 55.6424) -> (-115.5712, 55.6424) projected
  line L11 (-67.0712, 54.6424) -> (-114.5712, 54.6424)
  line L12 (-114.5712, 54.6424) -> (-114.5712, 55.6424)
  line L13 (-114.5712, 55.6424) -> (-67.0712, 55.6424)
  line L14 (-67.0712, 55.6424) -> (-67.0712, 54.6424)
  point P0 (0, 0)
extrude "Extrusion7" cut sketch "Skizze7" along normal up to surface (52.8 mm away)
sketch "Skizze9" plane through (-117.5712, 54.6424, 0) normal (-1, 0, 0) x (0, 0, 1)
  line L0 (2, -112.3) -> (2, 1) construction
  line L1 (55.8, -112.3) -> (2, -112.3) construction
  line L2 (55.8, 1) -> (55.8, -112.3) construction
  line L3 (2, 1) -> (55.8, 1) construction
  line L4 (52.8, -101.3) -> (38.3, -101.3) construction
  line L5 (52.8, -81.3) -> (38.3, -81.3) construction
  line L6 (36.3, -99.3) -> (36.3, -83.3) construction
  line L7 (55.8, -111.3) -> (55.8, 1) construction
  line L8 (55.8, -101.3) -> (50.8, -101.3)
  line L9 (50.8, -77.9589) -> (50.8, -2.6275)
  line L10 (50.8, -2.6275) -> (55.8, -2.6275)
  line L11 (50.8, -101.3) -> (40.8, -101.3)
  line L12 (40.8, -101.3) -> (40.8, -81.3)
  line L13 (40.8, -81.3) -> (50.8, -81.3)
  line L14 (50.8, -81.3) -> (55.8, -81.3)
  line L15 (55.8, -77.9589) -> (50.8, -77.9589)
  line L16 (55.8, -2.6275) -> (55.8, -77.9589)
  line L17 (55.8, -81.3) -> (55.8, -101.3)
  point P0 (0, -54.6424)
  dimension "d31" = 5
extrude "Extrusion9" cut sketch "Skizze9" against normal blind 3
fillet "Rundung4" radius 1 8 edges at (-117.5712, -46.6576, 48.3) (-117.5712, -36.6576, 40.8) (-114.5712, -46.6576, 48.3) (-117.5712, -23.3164, 53.3) (-117.5712, -26.6576, 48.3) (-117.5712, 14.3492, 50.8) (-114.5712, 14.3492, 50.8) (-117.5712, 52.0149, 53.3)
sketch "Skizze10" plane through (-117.5712, 54.6424, 0) normal (-1, 0, 0) x (0, 0, 1)
  line L0 (38.3, -3.2331) -> (55.8, -3.2331) construction
  line L1 (38.3, -11.2331) -> (38.3, -3.2331) construction
  line L2 (52.8, -11.2331) -> (38.3, -11.2331) construction
  line L3 (52.8, -11.2331) -> (52.8, -81.3) construction
  line L4 (52.8, -81.3) -> (38.3, -81.3) construction
  line L5 (38.3, -87.2689) -> (38.3, -81.3) construction
  arc A0 (38.3, -87.2689) -> (39.4111, -89.0605) centre (40.3, -87.2689) ccw construction
  arc A1 (40.7863, -91.0383) -> (39.4111, -89.0605) centre (38.3, -91.3) ccw construction
  line L6 (40.4663, -91.0383) -> (40.7863, -91.0383) construction
  line L7 (40.4663, -91.0383) -> (40.4663, -91.5741) construction
  line L8 (40.4663, -91.5741) -> (40.7849, -91.5741) construction
  arc A2 (39.4111, -93.5395) -> (40.7849, -91.5741) centre (38.3, -91.3) ccw construction
  arc A3 (39.4111, -93.5395) -> (38.3, -95.3311) centre (40.3, -95.3311) ccw construction
  line L9 (38.3, -101.3) -> (38.3, -95.3311) construction
  line L10 (52.8, -101.3) -> (38.3, -101.3) construction
  line L11 (52.8, -101.3) -> (52.8, -109.3) construction
  line L12 (55.8, -109.3) -> (52.8, -109.3) construction
  line L13 (55.8, -3.2331) -> (55.8, -109.3) construction
  arc A4 (40.8, -83.9404) -> (40.8, -98.6596) centre (38.3, -91.3) ccw
  line L14 (40.8, -101.3) -> (40.8, -81.3) projected
  line L15 (40.8, -98.6596) -> (40.8, -83.9404)
  point P0 (0, -54.6424)
extrude "Extrusion10" cut sketch "Skizze10" against normal blind 3
fillet "Rundung5" radius 1 6 edges at (-114.5712, -36.6576, 30.5274) (-117.2456, -29.2142, 40.5383) (-117.2456, -44.1009, 40.5383) (-115.5712, -29.298, 40.8) (-115.5712, -44.0172, 40.8) (-117.5712, -36.6576, 30.5274)
properties part number "PowerS_cap"
